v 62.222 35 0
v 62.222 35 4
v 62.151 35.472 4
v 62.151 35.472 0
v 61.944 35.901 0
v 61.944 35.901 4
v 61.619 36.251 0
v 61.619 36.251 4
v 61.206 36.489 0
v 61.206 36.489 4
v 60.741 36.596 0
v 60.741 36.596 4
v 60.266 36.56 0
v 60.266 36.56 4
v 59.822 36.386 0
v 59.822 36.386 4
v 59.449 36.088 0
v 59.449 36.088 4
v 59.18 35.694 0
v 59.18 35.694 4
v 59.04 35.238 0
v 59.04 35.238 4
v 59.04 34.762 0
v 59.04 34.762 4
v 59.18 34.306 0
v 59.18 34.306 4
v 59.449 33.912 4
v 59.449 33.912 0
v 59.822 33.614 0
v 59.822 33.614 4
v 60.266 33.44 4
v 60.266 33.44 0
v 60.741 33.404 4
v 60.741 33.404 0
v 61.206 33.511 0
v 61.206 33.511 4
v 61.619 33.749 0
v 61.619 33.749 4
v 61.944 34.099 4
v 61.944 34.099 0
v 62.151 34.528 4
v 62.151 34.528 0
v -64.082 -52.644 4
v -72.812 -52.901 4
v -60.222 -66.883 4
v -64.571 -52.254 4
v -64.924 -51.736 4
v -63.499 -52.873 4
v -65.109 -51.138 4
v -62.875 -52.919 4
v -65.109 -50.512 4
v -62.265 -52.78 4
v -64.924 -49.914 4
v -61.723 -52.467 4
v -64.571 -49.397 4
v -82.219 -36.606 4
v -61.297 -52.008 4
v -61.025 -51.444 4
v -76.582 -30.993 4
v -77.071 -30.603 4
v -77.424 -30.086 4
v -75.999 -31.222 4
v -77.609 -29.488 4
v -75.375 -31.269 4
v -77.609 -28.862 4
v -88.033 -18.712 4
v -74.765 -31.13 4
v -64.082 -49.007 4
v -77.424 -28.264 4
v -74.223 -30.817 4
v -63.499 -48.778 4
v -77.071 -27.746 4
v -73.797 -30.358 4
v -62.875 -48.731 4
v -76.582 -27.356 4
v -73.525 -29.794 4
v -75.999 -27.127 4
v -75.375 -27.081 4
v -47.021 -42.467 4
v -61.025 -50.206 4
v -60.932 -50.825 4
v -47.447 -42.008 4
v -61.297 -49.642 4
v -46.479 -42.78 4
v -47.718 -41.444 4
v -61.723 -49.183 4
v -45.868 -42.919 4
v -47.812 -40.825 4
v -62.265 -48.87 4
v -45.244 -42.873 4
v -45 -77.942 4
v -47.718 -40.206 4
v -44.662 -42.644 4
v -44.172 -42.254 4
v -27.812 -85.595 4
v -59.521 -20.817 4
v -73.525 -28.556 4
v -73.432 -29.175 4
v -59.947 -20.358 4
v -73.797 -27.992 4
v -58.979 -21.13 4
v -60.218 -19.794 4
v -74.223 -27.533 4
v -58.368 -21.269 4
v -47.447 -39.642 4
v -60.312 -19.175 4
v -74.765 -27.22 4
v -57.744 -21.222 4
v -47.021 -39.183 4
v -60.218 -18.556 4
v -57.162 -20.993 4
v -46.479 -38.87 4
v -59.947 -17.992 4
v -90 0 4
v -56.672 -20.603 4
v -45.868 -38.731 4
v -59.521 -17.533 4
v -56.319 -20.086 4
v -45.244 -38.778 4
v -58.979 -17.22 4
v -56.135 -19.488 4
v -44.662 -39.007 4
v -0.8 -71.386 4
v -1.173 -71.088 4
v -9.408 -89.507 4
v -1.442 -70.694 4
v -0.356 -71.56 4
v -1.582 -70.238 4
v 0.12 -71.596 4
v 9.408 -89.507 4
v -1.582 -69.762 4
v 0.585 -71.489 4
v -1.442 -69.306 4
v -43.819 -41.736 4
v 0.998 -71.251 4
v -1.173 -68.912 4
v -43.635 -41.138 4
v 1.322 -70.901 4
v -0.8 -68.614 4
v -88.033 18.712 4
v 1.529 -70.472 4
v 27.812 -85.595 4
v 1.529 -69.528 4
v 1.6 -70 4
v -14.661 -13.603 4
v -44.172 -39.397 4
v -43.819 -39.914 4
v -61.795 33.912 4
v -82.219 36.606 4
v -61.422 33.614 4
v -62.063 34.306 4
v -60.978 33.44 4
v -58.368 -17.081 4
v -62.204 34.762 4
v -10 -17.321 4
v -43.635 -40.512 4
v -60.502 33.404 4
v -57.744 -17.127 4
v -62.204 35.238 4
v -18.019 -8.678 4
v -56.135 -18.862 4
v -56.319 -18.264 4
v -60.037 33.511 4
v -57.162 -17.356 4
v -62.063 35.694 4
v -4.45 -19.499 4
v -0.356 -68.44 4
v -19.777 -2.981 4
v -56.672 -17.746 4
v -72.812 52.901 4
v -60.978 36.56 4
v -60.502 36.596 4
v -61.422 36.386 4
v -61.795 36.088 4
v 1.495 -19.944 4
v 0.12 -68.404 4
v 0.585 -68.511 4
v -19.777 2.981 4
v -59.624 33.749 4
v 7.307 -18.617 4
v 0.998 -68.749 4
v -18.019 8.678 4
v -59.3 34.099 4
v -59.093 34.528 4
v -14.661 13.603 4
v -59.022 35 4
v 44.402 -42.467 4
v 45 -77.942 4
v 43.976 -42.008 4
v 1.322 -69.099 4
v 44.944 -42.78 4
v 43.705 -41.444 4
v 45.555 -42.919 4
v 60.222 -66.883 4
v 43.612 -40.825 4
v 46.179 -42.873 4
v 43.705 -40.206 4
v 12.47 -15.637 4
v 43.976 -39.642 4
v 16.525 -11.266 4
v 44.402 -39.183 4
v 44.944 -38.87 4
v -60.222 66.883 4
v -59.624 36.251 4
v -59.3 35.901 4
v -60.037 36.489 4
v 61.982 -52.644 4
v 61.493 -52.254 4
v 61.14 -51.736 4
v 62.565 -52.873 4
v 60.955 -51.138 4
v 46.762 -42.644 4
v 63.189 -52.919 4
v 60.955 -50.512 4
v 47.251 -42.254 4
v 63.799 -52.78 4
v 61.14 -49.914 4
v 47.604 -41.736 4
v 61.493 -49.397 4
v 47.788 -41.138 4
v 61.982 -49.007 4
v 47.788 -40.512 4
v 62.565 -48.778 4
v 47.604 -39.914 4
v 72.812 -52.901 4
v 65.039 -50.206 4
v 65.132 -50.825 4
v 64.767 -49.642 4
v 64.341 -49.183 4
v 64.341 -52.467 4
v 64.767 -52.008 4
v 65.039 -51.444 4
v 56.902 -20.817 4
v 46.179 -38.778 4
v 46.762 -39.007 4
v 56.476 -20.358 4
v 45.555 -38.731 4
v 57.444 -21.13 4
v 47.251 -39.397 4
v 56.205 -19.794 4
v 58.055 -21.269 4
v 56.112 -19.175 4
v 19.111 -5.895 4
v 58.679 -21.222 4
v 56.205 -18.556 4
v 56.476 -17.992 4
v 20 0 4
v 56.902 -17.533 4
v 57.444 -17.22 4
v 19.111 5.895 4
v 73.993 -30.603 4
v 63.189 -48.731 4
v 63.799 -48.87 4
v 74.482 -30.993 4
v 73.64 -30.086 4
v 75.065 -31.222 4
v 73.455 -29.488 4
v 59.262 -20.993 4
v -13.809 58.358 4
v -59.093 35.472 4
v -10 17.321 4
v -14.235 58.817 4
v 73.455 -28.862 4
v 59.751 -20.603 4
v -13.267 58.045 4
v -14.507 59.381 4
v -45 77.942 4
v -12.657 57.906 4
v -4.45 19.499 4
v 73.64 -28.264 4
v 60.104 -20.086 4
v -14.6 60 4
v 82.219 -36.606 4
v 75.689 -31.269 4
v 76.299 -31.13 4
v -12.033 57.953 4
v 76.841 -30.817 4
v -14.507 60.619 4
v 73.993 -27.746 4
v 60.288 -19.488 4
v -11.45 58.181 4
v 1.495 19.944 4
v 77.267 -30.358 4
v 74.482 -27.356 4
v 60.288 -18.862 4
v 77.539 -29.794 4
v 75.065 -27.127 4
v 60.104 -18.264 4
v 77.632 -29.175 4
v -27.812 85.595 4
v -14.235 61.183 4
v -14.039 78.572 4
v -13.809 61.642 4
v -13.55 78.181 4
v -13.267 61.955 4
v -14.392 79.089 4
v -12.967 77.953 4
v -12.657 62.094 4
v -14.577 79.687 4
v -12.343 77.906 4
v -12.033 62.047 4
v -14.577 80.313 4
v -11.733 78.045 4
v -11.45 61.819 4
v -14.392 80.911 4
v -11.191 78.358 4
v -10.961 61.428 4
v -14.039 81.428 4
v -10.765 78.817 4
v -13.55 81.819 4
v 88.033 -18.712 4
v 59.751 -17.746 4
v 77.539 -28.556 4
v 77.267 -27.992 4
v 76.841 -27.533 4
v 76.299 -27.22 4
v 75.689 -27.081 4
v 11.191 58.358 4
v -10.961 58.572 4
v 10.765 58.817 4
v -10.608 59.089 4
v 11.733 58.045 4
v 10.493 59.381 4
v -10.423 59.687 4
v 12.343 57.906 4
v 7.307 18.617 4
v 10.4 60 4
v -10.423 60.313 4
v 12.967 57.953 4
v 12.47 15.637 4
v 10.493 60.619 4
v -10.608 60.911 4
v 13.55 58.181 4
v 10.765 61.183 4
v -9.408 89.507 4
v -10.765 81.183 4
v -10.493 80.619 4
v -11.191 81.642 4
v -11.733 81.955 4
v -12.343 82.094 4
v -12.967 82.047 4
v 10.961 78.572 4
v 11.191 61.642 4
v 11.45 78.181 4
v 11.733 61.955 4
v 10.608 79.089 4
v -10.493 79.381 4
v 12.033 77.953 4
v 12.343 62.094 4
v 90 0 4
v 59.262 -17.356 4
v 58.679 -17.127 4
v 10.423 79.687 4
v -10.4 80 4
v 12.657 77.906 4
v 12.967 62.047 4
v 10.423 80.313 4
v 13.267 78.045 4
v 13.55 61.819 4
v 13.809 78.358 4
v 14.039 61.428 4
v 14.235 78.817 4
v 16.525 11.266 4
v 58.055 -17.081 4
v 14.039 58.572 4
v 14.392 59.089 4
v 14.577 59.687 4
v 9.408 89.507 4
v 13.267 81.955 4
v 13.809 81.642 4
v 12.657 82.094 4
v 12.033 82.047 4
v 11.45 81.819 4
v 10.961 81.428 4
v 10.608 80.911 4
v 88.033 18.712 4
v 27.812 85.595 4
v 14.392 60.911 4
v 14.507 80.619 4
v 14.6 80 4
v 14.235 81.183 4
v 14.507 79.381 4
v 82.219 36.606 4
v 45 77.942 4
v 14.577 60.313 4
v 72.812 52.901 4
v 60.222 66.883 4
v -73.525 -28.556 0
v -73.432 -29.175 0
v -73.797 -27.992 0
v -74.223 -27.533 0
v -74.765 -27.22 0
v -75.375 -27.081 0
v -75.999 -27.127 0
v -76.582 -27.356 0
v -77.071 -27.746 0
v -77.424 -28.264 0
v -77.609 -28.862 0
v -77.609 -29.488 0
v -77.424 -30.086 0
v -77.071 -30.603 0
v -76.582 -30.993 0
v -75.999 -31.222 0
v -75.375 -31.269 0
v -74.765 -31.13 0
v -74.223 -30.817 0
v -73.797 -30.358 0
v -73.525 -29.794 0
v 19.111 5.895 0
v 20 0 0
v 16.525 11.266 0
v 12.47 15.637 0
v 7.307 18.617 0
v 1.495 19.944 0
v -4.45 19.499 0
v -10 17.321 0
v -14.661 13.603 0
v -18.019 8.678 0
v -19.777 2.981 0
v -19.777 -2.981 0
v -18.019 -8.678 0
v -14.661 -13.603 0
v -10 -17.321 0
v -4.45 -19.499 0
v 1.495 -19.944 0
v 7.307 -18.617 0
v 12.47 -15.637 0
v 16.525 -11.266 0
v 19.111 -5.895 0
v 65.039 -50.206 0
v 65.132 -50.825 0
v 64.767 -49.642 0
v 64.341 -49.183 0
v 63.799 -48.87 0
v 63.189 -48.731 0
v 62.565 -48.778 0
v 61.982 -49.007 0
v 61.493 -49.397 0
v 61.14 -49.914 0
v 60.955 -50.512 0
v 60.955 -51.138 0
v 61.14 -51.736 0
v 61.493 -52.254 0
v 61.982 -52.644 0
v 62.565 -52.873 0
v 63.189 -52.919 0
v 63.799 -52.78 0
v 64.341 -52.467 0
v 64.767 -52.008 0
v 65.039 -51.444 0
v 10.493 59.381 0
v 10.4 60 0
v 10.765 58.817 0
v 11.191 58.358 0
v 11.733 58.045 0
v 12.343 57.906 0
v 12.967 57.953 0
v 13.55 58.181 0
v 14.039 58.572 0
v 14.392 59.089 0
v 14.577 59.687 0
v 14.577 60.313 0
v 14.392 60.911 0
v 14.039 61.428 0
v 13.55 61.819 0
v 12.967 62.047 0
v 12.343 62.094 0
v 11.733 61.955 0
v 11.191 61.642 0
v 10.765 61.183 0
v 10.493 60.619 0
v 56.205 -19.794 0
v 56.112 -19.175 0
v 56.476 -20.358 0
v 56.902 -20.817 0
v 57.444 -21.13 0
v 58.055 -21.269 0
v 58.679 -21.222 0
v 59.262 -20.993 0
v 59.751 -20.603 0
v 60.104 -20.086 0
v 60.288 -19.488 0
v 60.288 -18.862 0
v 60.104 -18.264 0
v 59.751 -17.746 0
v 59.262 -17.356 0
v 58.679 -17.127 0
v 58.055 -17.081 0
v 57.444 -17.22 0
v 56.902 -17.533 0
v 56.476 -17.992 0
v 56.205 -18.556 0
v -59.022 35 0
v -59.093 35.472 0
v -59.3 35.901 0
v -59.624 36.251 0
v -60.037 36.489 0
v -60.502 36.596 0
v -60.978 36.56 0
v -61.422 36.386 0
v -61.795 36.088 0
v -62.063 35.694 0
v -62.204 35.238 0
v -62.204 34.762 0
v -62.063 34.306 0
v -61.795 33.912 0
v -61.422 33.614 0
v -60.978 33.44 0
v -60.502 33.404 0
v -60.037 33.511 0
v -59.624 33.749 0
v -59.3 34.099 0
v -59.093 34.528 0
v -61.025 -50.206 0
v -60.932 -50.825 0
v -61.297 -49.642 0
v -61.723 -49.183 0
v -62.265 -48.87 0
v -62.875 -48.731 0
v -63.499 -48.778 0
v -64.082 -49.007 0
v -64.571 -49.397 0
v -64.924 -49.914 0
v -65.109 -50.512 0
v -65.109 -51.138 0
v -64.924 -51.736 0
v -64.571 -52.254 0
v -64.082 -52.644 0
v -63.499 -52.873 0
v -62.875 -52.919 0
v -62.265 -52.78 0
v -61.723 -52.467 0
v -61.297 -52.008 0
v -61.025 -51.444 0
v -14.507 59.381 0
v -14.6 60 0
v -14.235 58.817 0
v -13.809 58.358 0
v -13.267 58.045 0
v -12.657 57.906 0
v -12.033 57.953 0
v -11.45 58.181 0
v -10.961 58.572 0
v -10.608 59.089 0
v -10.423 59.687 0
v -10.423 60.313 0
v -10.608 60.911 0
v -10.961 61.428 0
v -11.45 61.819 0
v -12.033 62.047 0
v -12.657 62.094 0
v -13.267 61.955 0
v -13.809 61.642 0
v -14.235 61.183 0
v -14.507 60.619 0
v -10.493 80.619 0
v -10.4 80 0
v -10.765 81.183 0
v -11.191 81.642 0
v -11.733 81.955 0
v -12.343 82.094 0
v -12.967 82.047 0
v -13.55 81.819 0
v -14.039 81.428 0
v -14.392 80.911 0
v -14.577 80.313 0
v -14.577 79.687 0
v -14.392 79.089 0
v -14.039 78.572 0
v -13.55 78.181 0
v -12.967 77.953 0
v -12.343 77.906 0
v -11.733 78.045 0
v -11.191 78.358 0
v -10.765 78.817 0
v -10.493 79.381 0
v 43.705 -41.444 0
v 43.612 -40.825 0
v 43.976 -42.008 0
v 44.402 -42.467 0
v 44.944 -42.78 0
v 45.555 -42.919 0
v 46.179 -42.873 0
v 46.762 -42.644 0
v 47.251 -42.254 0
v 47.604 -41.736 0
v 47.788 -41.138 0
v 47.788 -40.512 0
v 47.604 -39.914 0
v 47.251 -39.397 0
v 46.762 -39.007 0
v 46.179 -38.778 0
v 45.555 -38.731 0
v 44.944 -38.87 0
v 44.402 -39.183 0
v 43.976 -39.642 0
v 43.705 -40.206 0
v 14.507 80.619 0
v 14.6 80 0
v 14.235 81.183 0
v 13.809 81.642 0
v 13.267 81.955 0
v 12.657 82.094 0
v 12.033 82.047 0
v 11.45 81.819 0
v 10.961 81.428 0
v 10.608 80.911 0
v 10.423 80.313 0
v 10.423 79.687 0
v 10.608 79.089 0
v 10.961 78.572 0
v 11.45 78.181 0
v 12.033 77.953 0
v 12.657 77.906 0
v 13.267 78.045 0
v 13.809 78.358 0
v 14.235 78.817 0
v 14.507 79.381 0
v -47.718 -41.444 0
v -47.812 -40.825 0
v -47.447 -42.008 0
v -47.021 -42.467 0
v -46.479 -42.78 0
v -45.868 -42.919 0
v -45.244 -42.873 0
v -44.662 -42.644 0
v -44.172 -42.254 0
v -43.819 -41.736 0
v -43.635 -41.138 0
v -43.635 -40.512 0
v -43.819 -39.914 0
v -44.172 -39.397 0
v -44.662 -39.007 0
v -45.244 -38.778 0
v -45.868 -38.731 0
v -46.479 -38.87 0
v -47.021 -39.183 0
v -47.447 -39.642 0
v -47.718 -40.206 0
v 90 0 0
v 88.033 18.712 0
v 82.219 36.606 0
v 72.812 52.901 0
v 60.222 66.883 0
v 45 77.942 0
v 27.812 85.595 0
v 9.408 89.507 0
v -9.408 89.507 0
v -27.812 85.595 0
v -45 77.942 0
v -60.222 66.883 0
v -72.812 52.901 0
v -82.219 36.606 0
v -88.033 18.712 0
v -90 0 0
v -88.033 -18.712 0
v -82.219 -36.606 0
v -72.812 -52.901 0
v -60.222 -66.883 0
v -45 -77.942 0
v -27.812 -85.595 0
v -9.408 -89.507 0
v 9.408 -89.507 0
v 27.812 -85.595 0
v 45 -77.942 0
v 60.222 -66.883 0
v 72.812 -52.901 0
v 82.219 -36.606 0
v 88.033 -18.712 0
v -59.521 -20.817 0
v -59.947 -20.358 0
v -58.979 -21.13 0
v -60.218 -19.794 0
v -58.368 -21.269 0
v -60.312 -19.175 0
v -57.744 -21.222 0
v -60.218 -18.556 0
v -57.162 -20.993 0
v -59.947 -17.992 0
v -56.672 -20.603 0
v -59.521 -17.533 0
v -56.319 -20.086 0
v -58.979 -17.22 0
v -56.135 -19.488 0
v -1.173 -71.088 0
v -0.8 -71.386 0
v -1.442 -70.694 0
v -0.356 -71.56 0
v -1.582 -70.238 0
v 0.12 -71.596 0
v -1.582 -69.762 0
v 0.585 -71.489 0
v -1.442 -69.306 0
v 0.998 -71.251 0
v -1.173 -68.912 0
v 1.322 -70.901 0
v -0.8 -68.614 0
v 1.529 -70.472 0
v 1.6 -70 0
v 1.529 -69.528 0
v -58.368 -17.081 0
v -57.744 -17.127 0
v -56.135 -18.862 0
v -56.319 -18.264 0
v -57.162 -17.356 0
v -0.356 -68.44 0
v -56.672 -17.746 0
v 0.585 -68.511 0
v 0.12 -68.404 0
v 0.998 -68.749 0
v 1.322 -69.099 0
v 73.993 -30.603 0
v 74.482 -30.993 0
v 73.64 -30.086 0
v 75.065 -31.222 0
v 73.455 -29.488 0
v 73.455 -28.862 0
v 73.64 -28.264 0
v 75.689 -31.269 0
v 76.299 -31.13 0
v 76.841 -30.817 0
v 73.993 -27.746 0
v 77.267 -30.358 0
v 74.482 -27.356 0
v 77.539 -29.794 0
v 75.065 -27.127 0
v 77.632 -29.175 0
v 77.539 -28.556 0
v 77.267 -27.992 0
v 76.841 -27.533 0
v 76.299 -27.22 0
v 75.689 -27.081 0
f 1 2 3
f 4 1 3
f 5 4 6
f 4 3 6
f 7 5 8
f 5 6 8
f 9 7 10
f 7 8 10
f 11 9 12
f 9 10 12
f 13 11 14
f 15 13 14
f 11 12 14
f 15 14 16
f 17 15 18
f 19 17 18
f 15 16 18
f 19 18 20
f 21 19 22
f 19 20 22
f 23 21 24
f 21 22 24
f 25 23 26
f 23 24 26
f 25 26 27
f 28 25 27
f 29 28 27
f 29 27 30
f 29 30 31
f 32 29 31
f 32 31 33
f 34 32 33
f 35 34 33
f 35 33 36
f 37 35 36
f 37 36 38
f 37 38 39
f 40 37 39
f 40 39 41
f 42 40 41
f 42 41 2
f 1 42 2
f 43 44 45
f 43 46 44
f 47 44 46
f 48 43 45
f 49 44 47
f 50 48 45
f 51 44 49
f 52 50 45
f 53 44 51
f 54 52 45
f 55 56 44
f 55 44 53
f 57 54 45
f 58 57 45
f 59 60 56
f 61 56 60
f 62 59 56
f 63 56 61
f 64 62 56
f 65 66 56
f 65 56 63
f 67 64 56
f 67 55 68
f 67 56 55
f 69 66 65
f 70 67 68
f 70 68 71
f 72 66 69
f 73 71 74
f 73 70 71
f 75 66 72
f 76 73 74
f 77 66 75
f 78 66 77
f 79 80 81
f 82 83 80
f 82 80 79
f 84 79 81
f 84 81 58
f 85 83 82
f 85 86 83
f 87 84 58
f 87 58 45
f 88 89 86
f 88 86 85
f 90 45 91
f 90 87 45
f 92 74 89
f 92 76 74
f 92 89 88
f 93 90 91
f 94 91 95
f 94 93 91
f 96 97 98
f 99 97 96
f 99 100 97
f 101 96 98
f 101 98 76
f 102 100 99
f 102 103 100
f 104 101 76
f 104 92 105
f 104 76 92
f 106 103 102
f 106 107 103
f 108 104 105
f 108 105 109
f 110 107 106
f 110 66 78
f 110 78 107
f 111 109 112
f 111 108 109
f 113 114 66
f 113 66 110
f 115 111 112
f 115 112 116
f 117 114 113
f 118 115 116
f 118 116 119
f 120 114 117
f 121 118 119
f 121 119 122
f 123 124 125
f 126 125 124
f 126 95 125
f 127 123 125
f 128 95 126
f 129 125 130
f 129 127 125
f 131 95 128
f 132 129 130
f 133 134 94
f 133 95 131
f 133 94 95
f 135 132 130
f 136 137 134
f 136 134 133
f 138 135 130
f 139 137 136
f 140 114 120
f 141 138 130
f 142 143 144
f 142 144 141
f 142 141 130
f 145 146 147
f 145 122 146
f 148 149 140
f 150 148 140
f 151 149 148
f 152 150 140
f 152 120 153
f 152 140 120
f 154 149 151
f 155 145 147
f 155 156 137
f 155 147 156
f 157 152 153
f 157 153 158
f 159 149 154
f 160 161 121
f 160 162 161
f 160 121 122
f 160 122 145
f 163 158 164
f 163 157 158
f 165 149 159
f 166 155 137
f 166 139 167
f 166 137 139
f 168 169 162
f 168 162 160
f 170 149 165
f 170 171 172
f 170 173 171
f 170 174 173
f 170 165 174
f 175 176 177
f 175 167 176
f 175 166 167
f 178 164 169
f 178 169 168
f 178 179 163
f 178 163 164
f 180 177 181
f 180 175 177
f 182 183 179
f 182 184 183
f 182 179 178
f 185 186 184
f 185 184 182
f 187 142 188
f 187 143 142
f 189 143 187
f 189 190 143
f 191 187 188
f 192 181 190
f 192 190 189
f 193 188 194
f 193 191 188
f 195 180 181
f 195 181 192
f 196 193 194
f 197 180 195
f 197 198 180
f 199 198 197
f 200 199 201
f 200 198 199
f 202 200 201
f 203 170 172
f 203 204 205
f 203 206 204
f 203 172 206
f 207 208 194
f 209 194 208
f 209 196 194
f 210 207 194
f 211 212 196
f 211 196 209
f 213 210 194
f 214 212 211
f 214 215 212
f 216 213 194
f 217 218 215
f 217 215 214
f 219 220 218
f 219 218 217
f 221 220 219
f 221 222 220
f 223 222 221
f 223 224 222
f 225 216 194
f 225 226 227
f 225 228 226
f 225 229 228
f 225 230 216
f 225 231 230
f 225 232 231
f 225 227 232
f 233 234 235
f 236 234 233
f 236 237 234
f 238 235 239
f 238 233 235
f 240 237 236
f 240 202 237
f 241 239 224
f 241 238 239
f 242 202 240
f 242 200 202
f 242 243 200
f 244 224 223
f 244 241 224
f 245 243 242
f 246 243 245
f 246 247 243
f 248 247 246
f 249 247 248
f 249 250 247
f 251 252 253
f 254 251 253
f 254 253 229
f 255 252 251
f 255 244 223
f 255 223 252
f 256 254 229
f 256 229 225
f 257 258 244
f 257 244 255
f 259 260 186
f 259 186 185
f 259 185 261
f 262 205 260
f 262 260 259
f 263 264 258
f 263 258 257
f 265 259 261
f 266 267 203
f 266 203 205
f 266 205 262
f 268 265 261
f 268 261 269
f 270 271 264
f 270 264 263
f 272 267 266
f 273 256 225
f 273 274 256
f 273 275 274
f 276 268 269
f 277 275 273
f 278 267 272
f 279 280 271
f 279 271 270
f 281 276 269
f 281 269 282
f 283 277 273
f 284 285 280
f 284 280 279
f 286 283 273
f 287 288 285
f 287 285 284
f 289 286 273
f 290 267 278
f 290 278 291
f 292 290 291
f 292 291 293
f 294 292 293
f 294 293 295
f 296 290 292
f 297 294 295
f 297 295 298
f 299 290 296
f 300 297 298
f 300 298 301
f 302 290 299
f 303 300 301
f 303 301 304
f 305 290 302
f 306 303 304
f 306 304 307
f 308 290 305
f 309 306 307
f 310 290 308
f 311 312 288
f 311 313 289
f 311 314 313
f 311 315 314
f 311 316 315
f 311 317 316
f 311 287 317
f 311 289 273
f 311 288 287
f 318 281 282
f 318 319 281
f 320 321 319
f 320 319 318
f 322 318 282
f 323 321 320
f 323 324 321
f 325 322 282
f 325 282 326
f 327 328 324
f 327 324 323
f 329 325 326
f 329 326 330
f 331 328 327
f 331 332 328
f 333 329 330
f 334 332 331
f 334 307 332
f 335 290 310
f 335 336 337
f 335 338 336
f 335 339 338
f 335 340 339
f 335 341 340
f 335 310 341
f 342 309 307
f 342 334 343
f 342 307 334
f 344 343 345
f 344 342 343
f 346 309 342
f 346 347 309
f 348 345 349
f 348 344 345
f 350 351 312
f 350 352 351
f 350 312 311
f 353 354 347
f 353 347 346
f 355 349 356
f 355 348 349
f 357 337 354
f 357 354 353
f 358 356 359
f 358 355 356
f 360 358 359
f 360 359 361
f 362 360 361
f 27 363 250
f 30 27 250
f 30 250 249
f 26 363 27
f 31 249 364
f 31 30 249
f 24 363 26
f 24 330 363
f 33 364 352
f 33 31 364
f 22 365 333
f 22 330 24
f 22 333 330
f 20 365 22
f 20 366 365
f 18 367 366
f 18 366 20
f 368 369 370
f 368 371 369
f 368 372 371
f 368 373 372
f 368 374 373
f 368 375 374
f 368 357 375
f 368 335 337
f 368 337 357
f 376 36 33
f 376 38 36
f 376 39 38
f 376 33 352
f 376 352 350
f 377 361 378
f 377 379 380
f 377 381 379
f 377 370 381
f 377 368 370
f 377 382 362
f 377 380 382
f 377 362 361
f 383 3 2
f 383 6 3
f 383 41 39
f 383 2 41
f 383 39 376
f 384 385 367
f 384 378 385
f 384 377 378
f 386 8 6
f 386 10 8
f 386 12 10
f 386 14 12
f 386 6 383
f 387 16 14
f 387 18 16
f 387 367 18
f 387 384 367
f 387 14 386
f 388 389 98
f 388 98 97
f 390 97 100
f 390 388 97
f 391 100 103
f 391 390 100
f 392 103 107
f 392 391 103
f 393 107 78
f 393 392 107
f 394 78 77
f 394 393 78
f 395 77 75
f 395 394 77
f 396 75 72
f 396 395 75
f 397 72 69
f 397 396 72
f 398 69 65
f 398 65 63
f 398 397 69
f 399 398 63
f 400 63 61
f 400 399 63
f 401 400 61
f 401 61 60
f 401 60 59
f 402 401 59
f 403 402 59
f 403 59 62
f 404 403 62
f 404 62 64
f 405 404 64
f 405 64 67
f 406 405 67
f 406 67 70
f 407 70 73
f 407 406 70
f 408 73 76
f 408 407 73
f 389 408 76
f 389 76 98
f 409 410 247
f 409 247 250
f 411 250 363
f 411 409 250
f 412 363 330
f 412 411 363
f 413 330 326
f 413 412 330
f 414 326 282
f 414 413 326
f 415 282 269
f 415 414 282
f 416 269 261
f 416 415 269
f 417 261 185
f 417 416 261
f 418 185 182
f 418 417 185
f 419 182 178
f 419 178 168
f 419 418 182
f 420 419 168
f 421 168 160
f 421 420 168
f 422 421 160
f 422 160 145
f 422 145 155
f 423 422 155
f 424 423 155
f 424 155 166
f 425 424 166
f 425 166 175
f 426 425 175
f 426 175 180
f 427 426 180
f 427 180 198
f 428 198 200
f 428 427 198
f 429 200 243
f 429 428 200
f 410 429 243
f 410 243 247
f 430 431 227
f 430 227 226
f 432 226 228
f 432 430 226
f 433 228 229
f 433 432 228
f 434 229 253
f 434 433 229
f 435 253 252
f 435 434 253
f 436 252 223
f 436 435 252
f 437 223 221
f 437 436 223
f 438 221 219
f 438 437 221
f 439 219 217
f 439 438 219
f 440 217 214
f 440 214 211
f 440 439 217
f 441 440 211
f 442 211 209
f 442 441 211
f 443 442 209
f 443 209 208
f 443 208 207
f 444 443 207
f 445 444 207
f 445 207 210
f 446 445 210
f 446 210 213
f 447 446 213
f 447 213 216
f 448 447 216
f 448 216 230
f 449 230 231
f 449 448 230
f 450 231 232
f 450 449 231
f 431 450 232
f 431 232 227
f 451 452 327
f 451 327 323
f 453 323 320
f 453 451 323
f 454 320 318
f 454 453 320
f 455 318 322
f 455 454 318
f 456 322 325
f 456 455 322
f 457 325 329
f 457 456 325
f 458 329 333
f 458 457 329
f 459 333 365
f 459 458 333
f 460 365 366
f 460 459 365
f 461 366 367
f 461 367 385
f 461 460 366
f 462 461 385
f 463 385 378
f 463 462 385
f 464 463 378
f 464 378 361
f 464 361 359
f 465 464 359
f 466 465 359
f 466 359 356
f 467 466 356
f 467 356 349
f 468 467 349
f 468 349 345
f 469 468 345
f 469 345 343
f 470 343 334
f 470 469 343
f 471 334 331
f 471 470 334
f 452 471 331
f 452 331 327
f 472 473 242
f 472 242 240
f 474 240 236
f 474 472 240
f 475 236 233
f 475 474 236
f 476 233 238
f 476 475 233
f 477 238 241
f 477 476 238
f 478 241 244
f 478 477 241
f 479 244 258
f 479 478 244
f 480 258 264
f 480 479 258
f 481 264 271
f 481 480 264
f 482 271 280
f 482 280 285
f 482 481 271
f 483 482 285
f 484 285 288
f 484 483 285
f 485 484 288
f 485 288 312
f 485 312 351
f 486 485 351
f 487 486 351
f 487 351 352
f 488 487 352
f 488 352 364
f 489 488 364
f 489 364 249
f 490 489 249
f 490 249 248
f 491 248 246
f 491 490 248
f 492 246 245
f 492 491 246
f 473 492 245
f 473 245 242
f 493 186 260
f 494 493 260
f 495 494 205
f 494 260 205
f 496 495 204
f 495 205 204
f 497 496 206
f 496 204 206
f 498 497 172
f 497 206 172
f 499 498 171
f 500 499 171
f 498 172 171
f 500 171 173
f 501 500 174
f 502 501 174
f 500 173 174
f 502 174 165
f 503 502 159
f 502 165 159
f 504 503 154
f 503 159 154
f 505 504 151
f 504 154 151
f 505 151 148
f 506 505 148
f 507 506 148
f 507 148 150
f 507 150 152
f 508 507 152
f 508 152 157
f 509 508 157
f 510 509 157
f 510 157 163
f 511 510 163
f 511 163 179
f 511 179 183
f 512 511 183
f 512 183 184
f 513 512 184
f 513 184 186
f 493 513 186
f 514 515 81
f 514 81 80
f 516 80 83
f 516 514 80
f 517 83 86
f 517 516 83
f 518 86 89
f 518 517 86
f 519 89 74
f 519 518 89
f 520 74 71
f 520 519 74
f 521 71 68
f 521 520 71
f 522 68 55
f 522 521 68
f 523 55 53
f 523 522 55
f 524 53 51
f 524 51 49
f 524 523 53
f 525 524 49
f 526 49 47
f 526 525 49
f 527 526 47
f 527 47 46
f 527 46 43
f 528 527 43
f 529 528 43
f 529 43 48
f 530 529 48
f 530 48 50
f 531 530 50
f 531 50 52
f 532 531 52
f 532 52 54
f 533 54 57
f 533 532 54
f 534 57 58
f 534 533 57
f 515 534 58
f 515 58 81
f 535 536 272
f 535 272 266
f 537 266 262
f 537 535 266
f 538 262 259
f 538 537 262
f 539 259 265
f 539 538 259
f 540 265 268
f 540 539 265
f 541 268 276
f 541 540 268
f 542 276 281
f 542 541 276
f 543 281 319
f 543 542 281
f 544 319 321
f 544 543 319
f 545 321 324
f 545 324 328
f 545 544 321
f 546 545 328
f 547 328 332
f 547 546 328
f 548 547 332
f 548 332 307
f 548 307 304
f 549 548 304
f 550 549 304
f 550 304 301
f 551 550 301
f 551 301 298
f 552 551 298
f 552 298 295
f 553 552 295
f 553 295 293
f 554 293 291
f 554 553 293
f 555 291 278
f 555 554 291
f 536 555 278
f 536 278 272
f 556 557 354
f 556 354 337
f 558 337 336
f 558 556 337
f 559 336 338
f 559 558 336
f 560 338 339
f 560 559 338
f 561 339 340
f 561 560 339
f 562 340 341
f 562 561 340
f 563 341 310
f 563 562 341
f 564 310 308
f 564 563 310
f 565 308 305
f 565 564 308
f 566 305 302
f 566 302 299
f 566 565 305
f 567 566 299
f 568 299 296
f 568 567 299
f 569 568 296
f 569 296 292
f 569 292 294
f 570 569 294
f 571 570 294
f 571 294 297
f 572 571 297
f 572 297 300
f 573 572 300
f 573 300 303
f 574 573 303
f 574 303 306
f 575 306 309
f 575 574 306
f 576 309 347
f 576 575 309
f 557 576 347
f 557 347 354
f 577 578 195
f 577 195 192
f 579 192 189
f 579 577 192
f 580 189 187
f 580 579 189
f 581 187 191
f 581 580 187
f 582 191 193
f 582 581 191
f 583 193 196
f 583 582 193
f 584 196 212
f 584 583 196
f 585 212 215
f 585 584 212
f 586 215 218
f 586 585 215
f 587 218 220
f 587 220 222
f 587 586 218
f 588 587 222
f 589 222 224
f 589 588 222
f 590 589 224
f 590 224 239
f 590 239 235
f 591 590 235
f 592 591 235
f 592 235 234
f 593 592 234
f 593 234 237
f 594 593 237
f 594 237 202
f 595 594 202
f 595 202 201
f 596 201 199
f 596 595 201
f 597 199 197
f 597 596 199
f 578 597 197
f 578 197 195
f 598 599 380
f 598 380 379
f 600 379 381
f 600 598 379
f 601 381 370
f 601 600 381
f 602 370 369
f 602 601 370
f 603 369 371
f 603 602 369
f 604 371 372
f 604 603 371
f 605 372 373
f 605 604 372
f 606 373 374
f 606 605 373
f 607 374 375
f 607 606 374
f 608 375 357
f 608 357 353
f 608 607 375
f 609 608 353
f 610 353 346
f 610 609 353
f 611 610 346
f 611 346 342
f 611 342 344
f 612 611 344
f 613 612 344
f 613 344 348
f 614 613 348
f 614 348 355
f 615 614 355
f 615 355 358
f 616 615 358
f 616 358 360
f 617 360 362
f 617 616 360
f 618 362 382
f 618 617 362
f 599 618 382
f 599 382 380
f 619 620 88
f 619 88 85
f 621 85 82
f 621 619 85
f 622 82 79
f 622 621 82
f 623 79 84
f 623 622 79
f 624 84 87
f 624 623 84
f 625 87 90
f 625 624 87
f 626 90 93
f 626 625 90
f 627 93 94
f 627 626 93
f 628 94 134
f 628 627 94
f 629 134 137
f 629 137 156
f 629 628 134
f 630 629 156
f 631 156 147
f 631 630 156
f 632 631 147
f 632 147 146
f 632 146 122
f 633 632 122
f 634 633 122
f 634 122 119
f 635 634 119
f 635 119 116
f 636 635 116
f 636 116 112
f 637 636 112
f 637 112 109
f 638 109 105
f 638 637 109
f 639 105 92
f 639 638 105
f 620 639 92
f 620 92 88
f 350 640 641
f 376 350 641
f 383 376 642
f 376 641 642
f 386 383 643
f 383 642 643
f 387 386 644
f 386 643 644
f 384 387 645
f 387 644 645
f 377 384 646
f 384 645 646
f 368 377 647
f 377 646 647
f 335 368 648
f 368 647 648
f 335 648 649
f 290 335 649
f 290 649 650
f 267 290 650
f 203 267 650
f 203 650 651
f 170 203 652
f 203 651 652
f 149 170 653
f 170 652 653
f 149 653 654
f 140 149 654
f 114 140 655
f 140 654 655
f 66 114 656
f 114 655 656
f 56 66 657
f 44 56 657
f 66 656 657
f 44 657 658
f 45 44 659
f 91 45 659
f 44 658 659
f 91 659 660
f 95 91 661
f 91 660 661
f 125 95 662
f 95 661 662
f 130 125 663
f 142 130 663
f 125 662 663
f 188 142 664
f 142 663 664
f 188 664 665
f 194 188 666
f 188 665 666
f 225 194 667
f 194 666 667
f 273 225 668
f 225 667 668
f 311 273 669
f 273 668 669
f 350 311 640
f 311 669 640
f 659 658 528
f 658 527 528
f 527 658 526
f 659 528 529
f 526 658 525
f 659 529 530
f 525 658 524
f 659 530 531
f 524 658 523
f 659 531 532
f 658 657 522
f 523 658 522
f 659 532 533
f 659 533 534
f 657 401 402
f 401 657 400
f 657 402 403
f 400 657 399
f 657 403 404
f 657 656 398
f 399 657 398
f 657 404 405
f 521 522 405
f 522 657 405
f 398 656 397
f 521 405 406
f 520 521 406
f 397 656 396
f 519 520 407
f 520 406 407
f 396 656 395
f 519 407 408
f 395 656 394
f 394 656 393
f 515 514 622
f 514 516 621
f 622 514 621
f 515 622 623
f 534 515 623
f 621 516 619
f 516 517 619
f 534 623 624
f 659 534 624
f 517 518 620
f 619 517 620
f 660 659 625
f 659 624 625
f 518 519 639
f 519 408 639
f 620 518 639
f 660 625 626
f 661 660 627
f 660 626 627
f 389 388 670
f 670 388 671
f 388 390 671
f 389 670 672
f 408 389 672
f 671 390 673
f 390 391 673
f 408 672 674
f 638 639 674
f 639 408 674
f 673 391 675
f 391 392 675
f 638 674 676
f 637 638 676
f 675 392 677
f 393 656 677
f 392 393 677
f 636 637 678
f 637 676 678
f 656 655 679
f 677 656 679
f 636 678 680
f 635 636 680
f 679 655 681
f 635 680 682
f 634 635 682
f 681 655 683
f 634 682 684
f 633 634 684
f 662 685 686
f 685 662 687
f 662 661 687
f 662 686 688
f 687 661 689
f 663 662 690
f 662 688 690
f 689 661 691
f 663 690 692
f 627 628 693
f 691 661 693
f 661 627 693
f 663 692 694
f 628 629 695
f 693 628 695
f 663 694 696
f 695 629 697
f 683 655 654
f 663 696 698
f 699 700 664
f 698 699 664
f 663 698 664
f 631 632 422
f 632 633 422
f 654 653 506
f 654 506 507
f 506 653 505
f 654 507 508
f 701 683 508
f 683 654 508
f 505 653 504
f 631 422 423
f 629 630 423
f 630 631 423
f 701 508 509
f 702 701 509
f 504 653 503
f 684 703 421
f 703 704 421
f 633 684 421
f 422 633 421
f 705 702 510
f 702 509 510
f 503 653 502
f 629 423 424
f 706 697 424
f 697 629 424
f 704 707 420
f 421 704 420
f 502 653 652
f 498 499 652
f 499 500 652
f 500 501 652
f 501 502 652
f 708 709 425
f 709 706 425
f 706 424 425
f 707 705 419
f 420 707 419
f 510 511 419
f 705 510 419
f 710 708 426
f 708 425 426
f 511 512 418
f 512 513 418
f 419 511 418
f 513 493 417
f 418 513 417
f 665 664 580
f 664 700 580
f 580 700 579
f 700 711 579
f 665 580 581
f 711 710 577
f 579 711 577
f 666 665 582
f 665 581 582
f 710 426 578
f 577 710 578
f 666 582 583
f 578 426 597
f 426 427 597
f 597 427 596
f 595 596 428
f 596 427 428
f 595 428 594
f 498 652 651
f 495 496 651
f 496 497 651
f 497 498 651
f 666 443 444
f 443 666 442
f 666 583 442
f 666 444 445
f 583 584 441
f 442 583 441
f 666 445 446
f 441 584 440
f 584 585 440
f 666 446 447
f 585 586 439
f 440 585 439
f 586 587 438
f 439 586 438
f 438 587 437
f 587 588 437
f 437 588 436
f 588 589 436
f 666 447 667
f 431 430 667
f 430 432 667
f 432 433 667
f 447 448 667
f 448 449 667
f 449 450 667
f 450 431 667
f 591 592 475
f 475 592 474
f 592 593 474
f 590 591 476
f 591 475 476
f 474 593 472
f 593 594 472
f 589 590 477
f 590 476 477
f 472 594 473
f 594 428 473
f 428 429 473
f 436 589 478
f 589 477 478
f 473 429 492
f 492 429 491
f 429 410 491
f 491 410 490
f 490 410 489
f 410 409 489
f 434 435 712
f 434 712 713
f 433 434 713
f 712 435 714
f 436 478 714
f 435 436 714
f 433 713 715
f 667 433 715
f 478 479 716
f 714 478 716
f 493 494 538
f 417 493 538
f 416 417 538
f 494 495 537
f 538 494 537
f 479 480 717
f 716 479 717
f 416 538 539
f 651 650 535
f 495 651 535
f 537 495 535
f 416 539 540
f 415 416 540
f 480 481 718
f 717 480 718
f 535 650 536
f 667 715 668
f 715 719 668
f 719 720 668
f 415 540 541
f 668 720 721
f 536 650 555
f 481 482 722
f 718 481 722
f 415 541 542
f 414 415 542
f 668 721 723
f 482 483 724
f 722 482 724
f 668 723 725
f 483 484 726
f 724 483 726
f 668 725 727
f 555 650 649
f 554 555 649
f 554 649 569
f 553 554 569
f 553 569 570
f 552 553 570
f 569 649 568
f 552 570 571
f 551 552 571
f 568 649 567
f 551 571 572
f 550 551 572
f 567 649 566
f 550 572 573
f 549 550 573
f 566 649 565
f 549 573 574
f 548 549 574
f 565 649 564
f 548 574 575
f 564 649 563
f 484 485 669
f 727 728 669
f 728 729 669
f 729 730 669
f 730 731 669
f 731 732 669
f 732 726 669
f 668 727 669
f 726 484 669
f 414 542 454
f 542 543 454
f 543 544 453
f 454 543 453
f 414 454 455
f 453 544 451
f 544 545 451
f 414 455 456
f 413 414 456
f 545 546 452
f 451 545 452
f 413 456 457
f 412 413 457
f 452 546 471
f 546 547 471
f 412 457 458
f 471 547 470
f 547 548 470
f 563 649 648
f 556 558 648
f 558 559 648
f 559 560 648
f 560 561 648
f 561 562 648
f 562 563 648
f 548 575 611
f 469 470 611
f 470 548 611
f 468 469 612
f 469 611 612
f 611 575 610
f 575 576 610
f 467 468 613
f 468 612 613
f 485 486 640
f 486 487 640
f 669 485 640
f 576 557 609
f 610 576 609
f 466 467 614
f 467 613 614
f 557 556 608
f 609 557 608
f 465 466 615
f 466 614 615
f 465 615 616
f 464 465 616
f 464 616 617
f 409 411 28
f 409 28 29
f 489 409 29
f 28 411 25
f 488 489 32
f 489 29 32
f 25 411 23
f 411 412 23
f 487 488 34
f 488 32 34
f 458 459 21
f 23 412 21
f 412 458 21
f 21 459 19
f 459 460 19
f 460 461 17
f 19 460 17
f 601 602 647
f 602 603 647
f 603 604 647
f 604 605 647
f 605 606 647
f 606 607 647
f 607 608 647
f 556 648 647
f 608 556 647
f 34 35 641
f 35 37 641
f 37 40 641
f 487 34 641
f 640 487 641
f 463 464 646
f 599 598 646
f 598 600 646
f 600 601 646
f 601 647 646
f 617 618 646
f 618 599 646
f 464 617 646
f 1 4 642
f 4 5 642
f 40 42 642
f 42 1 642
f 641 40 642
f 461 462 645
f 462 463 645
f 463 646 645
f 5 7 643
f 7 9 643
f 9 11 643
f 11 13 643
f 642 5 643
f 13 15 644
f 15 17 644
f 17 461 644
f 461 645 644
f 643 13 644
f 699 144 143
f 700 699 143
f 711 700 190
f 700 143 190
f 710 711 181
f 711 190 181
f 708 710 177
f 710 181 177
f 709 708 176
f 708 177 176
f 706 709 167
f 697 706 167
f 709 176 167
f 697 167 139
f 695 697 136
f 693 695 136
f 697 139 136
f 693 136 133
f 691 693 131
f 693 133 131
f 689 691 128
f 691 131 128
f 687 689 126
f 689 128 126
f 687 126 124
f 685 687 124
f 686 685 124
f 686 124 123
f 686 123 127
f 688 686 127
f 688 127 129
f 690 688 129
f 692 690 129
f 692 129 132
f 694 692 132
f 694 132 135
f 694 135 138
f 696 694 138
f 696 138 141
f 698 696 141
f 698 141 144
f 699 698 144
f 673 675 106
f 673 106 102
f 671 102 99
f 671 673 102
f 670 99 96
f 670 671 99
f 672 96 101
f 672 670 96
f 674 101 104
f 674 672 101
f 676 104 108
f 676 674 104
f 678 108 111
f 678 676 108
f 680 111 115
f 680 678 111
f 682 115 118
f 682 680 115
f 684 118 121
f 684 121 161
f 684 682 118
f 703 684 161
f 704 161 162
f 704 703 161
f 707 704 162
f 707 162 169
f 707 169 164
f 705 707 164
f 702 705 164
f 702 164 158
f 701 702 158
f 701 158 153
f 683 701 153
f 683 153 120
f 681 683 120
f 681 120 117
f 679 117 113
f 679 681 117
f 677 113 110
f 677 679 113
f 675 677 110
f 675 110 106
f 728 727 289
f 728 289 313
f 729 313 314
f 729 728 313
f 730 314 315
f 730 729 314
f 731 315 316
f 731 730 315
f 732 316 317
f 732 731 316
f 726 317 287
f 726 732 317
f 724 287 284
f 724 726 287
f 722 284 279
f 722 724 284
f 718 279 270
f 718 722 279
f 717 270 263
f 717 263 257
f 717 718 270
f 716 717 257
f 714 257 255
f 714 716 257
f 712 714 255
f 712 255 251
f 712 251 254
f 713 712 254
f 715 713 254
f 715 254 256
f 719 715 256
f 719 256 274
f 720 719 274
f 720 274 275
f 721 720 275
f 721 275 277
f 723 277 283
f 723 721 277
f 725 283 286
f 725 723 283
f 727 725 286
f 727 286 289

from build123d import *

# Parameters (mm, degrees)
SKETCH_1_R          = 90
SKETCH_1_R_2        = 2.1
SKETCH_1_R_3        = 20
EXTRUDE_1_DEPTH     = 4
SKETCH_2_R          = 1.6
CUT_EXTRUDE_1_DEPTH = 10


with BuildPart() as part:
    # 草图1 → 凸台-拉伸1 (new body)
    with BuildSketch(Plane.XY):
        Circle(SKETCH_1_R)
        with Locations((12.5, 80)):
            Circle(SKETCH_1_R_2, mode=Mode.SUBTRACT)
        with Locations((-12.5, 80)):
            Circle(SKETCH_1_R_2, mode=Mode.SUBTRACT)
        with Locations(Location((12.5, 60, 0), (0, 0, 180))):
            Circle(SKETCH_1_R_2, mode=Mode.SUBTRACT)
        with Locations(Location((-12.5, 60, 0), (0, 0, 180))):
            Circle(SKETCH_1_R_2, mode=Mode.SUBTRACT)
        Circle(SKETCH_1_R_3, mode=Mode.SUBTRACT)
        with Locations((75.532032303, -29.174682453)):
            Circle(SKETCH_1_R_2, mode=Mode.SUBTRACT)
        with Locations(Location((58.211524227, -19.174682453, 0), (0, 0, 180))):
            Circle(SKETCH_1_R_2, mode=Mode.SUBTRACT)
        with Locations(Location((45.711524227, -40.825317547, 0), (0, 0, 180))):
            Circle(SKETCH_1_R_2, mode=Mode.SUBTRACT)
        with Locations((63.032032303, -50.825317547)):
            Circle(SKETCH_1_R_2, mode=Mode.SUBTRACT)
        with Locations((-63.032032303, -50.825317547)):
            Circle(SKETCH_1_R_2, mode=Mode.SUBTRACT)
        with Locations(Location((-45.711524227, -40.825317547, 0), (0, 0, 180))):
            Circle(SKETCH_1_R_2, mode=Mode.SUBTRACT)
        with Locations(Location((-58.211524227, -19.174682453, 0), (0, 0, 180))):
            Circle(SKETCH_1_R_2, mode=Mode.SUBTRACT)
        with Locations((-75.532032303, -29.174682453)):
            Circle(SKETCH_1_R_2, mode=Mode.SUBTRACT)
    extrude(amount=EXTRUDE_1_DEPTH)

    # 草图2 → 切除-拉伸1 (cut)
    with BuildSketch(Plane.XY.offset(4)):
        with Locations((0, -70)):
            Circle(SKETCH_2_R)
        with Locations((-60.621778265, 35)):
            Circle(SKETCH_2_R)
        with Locations((60.621778265, 35)):
            Circle(SKETCH_2_R)
    extrude(amount=-CUT_EXTRUDE_1_DEPTH, mode=Mode.SUBTRACT)


solid = part.part
